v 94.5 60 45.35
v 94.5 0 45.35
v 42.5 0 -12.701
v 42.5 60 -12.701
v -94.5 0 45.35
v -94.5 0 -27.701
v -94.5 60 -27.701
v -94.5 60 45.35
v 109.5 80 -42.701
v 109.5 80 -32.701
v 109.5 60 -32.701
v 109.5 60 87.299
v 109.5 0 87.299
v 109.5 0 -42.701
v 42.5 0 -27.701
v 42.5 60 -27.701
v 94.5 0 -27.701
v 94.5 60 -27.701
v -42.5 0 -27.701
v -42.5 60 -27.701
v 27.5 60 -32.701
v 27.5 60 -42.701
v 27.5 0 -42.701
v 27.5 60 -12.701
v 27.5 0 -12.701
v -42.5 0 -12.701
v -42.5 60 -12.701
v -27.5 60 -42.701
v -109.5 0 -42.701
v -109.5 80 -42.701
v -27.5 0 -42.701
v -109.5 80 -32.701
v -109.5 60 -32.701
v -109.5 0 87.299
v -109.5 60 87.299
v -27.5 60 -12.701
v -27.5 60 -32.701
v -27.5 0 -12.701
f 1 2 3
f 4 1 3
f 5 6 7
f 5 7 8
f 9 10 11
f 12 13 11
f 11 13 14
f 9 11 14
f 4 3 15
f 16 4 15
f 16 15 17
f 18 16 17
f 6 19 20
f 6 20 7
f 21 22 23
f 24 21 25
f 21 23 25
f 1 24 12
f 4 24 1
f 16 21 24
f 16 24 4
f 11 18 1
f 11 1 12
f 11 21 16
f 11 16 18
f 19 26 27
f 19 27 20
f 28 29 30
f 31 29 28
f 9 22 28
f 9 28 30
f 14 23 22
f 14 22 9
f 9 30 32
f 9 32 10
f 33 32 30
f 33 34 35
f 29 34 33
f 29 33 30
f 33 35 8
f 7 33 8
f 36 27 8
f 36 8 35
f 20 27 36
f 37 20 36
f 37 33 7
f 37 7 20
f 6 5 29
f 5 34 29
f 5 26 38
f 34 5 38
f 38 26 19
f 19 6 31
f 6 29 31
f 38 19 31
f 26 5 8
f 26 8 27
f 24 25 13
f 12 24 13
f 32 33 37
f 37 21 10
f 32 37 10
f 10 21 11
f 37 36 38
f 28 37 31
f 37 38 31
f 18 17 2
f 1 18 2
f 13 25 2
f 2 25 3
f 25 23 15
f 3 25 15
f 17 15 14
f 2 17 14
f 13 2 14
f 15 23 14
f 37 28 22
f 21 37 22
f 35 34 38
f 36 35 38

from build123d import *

# Parameters (mm, degrees)
BOSS_EXTRUDE1_DEPTH   = 60
BOSS_EXTRUDE1_2_DEPTH = 60
SKETCH3_W             = 219
SKETCH3_H             = 10
BOSS_EXTRUDE3_DEPTH   = 20


with BuildPart() as part:
    # Sketch1 → Boss-Extrude1 (new body)
    with BuildSketch(Plane(origin=(0, 0, 0), x_dir=(1, 0, 0), z_dir=(0, 1, 0))):
        Polygon((-109.5, 12.700803213), (-109.5, -87.299196787), (-27.5, 12.700803213), (-27.5, 42.700803213), (-109.5, 42.700803213), align=None)
        Polygon((-94.5, 27.700803213), (-94.5, -45.350177528), (-42.5, 12.700803213), (-42.5, 27.700803213), align=None, mode=Mode.SUBTRACT)
    extrude(amount=BOSS_EXTRUDE1_DEPTH)



with BuildPart() as body_2:
    # Sketch1 → Boss-Extrude1 2 (new body)
    with BuildSketch(Plane(origin=(0, 0, 0), x_dir=(1, 0, 0), z_dir=(0, 1, 0))):
        Polygon((109.5, 42.700803213), (27.5, 42.700803213), (27.5, 12.700803213), (109.5, -87.299196787), (109.5, 12.700803213), align=None)
        Polygon((42.5, 12.700803213), (42.5, 27.700803213), (94.5, 27.700803213), (94.5, -45.350177528), align=None, mode=Mode.SUBTRACT)
    extrude(amount=BOSS_EXTRUDE1_2_DEPTH)


with BuildPart() as part_1:
    add(part.part)

    add(body_2.part)  # Boss-Extrude3 merges body 2
    # Sketch3 → Boss-Extrude3 (add)
    with BuildSketch(Plane(origin=(0, 60, 0), x_dir=(1, 0, 0), z_dir=(0, 1, 0))):
        with Locations((0, 37.700803213)):
            Rectangle(SKETCH3_W, SKETCH3_H)
    extrude(amount=BOSS_EXTRUDE3_DEPTH)


solid = part_1.part
